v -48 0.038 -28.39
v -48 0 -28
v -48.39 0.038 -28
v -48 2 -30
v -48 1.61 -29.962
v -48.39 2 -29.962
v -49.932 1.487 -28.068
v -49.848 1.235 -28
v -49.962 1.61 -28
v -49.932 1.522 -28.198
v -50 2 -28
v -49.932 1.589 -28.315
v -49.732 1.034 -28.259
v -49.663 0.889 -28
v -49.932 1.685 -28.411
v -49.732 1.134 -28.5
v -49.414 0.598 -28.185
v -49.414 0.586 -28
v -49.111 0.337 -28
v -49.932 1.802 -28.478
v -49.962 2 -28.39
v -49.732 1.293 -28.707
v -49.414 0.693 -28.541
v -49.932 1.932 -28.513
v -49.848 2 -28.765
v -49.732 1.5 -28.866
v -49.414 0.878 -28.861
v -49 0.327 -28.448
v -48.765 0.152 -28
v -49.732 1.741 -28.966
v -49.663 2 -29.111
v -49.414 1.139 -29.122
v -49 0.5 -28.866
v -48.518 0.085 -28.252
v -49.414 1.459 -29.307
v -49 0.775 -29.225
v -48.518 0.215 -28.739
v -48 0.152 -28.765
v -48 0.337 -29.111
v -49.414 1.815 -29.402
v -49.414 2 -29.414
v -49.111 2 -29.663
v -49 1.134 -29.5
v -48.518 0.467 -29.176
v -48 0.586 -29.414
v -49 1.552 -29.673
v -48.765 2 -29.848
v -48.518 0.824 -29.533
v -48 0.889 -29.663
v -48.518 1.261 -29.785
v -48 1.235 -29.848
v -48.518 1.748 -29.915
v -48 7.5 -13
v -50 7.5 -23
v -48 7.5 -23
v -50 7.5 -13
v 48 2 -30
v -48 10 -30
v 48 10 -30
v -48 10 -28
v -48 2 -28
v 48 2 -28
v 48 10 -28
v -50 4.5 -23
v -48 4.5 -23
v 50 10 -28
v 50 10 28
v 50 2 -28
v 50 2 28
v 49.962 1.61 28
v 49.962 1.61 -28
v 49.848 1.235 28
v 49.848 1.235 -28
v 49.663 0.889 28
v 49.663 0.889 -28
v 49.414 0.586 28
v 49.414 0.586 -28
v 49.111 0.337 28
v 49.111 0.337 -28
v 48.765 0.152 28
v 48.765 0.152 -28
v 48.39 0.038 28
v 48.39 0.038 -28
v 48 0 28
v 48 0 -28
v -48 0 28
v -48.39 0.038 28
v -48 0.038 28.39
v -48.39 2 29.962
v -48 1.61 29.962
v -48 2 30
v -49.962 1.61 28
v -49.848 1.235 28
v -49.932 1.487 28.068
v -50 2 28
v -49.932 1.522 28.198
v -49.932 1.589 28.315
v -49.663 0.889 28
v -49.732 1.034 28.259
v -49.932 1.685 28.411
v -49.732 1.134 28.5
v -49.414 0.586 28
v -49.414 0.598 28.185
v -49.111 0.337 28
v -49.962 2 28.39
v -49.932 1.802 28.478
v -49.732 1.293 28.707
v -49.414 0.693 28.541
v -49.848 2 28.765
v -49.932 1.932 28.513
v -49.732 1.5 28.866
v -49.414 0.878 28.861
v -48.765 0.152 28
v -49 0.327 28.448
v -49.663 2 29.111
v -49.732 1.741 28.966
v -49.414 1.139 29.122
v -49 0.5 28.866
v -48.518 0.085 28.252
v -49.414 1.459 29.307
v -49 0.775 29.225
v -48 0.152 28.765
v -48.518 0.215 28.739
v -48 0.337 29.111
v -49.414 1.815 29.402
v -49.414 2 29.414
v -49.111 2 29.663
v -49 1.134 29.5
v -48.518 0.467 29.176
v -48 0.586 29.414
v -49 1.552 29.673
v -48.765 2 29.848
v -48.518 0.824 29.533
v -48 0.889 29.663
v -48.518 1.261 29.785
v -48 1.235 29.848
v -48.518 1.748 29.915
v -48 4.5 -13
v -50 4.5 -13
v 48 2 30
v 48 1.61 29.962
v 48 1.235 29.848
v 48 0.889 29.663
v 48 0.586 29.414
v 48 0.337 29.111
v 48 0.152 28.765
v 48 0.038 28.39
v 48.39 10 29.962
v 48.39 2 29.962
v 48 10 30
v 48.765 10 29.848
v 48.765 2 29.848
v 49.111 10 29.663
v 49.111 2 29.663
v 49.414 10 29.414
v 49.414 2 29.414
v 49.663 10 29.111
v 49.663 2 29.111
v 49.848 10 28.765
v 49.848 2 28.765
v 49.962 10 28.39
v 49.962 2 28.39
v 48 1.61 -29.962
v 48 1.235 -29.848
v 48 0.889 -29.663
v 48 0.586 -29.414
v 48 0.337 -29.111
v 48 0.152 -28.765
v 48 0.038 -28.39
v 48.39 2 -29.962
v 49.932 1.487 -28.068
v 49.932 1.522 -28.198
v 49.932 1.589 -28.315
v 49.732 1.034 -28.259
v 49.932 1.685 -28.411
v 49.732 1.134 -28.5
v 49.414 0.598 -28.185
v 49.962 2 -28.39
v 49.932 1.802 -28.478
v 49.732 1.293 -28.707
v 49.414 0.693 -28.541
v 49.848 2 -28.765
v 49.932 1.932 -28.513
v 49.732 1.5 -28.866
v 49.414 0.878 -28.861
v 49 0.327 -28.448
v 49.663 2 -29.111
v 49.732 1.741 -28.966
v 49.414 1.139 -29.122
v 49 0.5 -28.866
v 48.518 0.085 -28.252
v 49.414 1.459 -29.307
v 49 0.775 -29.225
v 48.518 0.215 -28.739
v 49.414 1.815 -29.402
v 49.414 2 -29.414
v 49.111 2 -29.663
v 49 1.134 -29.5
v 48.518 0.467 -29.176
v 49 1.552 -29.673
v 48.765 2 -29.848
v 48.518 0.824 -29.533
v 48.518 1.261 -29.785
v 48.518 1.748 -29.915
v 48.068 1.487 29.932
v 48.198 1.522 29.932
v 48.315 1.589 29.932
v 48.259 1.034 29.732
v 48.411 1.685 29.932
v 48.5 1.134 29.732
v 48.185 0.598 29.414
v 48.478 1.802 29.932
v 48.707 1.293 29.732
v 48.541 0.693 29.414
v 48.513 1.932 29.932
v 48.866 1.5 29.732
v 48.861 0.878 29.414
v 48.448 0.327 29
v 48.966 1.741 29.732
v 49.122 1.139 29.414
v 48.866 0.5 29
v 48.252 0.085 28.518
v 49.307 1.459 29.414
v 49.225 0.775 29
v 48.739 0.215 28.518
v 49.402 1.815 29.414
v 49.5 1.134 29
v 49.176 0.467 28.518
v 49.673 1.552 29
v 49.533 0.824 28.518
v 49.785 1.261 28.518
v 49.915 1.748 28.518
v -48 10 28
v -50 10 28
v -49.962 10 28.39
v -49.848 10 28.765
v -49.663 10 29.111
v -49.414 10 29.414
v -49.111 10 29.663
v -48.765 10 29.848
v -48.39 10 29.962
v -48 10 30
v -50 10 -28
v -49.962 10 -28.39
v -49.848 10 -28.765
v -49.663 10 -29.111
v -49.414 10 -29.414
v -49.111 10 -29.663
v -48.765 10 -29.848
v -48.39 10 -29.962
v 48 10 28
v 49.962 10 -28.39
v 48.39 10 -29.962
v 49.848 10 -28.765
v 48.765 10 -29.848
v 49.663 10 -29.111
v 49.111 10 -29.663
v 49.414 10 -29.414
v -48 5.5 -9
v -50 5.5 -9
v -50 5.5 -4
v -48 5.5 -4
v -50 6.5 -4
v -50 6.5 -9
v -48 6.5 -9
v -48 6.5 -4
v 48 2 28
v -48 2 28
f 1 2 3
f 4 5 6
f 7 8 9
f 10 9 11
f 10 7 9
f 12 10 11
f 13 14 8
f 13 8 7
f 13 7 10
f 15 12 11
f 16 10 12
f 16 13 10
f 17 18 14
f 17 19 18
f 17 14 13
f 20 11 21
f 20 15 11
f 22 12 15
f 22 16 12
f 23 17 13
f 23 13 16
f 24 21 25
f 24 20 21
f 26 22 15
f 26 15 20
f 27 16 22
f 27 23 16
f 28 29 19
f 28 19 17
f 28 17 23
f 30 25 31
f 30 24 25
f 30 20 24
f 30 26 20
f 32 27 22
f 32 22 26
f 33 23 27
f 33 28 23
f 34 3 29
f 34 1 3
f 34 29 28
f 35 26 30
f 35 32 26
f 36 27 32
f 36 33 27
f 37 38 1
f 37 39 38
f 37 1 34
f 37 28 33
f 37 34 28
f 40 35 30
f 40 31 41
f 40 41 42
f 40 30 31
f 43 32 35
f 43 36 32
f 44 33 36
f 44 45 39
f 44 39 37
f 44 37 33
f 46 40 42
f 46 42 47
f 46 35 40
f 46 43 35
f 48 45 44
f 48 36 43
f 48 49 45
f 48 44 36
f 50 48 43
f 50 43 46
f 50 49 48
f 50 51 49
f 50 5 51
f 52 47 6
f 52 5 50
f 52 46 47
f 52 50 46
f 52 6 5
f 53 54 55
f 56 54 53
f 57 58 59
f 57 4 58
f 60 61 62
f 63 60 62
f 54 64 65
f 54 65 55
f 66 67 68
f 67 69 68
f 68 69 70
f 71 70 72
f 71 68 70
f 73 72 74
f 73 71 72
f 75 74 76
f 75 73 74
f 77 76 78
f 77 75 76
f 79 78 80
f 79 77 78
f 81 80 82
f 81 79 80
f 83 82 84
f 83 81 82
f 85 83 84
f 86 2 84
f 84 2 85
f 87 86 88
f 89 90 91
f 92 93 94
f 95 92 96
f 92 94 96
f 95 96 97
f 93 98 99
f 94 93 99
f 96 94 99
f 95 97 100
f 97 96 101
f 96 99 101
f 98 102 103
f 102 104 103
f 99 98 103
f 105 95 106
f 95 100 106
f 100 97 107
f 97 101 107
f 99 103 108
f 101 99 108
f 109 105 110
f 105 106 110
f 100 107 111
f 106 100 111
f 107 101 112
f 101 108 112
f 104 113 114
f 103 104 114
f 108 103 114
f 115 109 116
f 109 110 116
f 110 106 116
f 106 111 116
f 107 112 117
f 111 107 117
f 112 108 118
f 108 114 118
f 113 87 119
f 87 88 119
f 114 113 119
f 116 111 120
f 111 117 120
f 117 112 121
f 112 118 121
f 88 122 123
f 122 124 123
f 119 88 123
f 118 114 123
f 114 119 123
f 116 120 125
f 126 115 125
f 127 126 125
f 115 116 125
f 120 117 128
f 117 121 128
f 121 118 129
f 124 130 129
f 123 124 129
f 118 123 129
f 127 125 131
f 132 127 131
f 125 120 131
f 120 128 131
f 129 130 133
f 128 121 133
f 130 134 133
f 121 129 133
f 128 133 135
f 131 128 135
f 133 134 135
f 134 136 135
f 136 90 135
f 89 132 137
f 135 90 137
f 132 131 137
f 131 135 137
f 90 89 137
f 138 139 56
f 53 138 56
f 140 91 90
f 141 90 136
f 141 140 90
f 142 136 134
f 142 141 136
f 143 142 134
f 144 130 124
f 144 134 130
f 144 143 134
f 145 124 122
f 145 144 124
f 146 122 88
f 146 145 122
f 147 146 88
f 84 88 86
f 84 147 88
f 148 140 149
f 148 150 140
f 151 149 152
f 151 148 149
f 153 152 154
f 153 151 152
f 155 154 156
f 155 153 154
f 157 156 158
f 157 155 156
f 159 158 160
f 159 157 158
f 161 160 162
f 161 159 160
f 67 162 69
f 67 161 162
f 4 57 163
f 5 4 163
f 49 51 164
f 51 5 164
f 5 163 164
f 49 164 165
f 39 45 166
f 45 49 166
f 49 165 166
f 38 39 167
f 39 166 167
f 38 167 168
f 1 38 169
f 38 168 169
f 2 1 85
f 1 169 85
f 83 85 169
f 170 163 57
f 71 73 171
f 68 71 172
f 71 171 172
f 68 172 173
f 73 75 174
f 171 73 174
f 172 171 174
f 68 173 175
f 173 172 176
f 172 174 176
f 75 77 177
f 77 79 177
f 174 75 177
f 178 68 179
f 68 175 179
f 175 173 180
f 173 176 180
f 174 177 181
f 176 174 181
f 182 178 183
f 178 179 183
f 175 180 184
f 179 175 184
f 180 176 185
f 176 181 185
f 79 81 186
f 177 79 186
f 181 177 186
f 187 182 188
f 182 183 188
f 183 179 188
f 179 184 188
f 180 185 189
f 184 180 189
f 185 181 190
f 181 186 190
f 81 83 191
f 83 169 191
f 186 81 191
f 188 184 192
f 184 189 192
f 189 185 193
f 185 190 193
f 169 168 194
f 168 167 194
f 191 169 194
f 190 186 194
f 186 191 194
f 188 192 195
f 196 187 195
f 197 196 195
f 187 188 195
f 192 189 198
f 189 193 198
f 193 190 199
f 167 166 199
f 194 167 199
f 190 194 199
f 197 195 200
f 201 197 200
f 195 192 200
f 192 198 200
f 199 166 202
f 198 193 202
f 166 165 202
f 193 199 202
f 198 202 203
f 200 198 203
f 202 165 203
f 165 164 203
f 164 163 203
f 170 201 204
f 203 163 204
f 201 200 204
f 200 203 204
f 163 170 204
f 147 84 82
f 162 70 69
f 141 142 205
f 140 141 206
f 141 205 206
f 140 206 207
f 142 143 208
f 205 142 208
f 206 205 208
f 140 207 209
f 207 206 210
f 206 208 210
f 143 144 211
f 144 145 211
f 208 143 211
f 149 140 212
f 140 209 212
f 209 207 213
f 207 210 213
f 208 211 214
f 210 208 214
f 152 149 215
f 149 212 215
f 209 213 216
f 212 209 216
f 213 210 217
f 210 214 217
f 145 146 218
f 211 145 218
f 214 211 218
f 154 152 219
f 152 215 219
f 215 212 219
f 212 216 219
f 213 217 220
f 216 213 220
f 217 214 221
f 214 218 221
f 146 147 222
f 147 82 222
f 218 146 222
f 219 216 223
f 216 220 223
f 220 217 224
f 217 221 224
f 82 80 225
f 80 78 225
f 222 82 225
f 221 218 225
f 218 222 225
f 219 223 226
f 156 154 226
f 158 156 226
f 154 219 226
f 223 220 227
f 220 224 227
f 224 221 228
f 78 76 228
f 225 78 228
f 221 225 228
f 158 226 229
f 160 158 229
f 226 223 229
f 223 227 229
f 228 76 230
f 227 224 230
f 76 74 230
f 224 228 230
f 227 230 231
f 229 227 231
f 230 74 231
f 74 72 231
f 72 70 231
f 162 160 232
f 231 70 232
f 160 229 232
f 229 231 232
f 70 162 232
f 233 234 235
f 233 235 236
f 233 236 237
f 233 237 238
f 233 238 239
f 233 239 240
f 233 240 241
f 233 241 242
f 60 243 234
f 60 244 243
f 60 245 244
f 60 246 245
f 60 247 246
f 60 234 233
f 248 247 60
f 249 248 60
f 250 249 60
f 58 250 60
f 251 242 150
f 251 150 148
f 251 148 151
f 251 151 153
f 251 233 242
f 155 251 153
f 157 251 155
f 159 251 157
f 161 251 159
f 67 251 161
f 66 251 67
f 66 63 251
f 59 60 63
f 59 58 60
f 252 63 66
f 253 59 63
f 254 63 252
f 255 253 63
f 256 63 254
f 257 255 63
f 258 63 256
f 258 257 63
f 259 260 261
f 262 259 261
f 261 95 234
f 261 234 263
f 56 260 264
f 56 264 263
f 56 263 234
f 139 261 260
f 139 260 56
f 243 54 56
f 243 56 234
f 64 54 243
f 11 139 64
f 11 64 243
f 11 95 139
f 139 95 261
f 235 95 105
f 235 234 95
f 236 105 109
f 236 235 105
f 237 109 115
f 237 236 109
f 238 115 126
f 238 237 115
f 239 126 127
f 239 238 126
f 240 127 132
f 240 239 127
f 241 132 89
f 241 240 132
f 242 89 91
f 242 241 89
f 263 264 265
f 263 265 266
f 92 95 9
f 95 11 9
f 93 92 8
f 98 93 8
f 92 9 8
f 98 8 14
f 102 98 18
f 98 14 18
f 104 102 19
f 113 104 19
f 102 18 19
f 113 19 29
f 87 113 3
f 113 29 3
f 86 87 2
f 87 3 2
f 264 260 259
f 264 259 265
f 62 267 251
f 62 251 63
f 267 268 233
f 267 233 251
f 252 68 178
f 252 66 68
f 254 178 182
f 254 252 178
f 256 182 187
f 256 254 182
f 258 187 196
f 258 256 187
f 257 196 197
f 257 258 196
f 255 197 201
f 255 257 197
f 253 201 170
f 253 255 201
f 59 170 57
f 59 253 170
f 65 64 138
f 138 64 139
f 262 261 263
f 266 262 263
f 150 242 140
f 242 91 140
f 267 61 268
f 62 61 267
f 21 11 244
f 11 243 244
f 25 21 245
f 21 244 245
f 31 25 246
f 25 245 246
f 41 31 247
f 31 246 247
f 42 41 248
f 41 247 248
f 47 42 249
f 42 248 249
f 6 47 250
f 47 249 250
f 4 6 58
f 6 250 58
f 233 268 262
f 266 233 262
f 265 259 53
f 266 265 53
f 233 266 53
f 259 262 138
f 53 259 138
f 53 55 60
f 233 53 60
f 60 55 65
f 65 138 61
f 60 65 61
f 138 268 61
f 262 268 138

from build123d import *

# Parameters (mm, degrees)
SKETCH1_W           = 100
SKETCH1_H           = 60
BOSS_EXTRUDE1_DEPTH = 10
SHELL1_T            = -2
FILLET1_R           = 2
SKETCH2_W           = 5
SKETCH2_H           = 1
SKETCH2_W_2         = 10
SKETCH2_H_2         = 3
CUT_EXTRUDE1_DEPTH  = 2


with BuildPart() as part:
    # Sketch1 → Boss-Extrude1 (new body)
    with BuildSketch(Plane(origin=(0, 0, 0), x_dir=(1, 0, 0), z_dir=(0, 1, 0))):
        Rectangle(SKETCH1_W, SKETCH1_H)
    extrude(amount=BOSS_EXTRUDE1_DEPTH)

    # Shell1
    shell1_openings = [part.faces().sort_by_distance(p)[0] for p in [
        (0, 10, 0),
    ]]
    offset(amount=SHELL1_T, openings=shell1_openings, kind=Kind.INTERSECTION)

    # Fillet1
    fillet1_edges = [part.edges().sort_by_distance(p)[0] for p in [
        (0, 0, -30),
        (50, 0, 0),
        (0, 0, 30),
        (-50, 0, 0),
        (-50, 5, -30),
        (50, 5, -30),
        (50, 5, 30),
        (-50, 5, 30),
    ]]
    fillet(fillet1_edges, radius=FILLET1_R)

    # Sketch2 → Cut-Extrude1 (cut)
    with BuildSketch(Plane.ZY.offset(50)):
        with Locations((-6.5, 6)):
            Rectangle(SKETCH2_W, SKETCH2_H)
        with Locations((-18, 6)):
            Rectangle(SKETCH2_W_2, SKETCH2_H_2)
    extrude(amount=-CUT_EXTRUDE1_DEPTH, mode=Mode.SUBTRACT)


solid = part.part
